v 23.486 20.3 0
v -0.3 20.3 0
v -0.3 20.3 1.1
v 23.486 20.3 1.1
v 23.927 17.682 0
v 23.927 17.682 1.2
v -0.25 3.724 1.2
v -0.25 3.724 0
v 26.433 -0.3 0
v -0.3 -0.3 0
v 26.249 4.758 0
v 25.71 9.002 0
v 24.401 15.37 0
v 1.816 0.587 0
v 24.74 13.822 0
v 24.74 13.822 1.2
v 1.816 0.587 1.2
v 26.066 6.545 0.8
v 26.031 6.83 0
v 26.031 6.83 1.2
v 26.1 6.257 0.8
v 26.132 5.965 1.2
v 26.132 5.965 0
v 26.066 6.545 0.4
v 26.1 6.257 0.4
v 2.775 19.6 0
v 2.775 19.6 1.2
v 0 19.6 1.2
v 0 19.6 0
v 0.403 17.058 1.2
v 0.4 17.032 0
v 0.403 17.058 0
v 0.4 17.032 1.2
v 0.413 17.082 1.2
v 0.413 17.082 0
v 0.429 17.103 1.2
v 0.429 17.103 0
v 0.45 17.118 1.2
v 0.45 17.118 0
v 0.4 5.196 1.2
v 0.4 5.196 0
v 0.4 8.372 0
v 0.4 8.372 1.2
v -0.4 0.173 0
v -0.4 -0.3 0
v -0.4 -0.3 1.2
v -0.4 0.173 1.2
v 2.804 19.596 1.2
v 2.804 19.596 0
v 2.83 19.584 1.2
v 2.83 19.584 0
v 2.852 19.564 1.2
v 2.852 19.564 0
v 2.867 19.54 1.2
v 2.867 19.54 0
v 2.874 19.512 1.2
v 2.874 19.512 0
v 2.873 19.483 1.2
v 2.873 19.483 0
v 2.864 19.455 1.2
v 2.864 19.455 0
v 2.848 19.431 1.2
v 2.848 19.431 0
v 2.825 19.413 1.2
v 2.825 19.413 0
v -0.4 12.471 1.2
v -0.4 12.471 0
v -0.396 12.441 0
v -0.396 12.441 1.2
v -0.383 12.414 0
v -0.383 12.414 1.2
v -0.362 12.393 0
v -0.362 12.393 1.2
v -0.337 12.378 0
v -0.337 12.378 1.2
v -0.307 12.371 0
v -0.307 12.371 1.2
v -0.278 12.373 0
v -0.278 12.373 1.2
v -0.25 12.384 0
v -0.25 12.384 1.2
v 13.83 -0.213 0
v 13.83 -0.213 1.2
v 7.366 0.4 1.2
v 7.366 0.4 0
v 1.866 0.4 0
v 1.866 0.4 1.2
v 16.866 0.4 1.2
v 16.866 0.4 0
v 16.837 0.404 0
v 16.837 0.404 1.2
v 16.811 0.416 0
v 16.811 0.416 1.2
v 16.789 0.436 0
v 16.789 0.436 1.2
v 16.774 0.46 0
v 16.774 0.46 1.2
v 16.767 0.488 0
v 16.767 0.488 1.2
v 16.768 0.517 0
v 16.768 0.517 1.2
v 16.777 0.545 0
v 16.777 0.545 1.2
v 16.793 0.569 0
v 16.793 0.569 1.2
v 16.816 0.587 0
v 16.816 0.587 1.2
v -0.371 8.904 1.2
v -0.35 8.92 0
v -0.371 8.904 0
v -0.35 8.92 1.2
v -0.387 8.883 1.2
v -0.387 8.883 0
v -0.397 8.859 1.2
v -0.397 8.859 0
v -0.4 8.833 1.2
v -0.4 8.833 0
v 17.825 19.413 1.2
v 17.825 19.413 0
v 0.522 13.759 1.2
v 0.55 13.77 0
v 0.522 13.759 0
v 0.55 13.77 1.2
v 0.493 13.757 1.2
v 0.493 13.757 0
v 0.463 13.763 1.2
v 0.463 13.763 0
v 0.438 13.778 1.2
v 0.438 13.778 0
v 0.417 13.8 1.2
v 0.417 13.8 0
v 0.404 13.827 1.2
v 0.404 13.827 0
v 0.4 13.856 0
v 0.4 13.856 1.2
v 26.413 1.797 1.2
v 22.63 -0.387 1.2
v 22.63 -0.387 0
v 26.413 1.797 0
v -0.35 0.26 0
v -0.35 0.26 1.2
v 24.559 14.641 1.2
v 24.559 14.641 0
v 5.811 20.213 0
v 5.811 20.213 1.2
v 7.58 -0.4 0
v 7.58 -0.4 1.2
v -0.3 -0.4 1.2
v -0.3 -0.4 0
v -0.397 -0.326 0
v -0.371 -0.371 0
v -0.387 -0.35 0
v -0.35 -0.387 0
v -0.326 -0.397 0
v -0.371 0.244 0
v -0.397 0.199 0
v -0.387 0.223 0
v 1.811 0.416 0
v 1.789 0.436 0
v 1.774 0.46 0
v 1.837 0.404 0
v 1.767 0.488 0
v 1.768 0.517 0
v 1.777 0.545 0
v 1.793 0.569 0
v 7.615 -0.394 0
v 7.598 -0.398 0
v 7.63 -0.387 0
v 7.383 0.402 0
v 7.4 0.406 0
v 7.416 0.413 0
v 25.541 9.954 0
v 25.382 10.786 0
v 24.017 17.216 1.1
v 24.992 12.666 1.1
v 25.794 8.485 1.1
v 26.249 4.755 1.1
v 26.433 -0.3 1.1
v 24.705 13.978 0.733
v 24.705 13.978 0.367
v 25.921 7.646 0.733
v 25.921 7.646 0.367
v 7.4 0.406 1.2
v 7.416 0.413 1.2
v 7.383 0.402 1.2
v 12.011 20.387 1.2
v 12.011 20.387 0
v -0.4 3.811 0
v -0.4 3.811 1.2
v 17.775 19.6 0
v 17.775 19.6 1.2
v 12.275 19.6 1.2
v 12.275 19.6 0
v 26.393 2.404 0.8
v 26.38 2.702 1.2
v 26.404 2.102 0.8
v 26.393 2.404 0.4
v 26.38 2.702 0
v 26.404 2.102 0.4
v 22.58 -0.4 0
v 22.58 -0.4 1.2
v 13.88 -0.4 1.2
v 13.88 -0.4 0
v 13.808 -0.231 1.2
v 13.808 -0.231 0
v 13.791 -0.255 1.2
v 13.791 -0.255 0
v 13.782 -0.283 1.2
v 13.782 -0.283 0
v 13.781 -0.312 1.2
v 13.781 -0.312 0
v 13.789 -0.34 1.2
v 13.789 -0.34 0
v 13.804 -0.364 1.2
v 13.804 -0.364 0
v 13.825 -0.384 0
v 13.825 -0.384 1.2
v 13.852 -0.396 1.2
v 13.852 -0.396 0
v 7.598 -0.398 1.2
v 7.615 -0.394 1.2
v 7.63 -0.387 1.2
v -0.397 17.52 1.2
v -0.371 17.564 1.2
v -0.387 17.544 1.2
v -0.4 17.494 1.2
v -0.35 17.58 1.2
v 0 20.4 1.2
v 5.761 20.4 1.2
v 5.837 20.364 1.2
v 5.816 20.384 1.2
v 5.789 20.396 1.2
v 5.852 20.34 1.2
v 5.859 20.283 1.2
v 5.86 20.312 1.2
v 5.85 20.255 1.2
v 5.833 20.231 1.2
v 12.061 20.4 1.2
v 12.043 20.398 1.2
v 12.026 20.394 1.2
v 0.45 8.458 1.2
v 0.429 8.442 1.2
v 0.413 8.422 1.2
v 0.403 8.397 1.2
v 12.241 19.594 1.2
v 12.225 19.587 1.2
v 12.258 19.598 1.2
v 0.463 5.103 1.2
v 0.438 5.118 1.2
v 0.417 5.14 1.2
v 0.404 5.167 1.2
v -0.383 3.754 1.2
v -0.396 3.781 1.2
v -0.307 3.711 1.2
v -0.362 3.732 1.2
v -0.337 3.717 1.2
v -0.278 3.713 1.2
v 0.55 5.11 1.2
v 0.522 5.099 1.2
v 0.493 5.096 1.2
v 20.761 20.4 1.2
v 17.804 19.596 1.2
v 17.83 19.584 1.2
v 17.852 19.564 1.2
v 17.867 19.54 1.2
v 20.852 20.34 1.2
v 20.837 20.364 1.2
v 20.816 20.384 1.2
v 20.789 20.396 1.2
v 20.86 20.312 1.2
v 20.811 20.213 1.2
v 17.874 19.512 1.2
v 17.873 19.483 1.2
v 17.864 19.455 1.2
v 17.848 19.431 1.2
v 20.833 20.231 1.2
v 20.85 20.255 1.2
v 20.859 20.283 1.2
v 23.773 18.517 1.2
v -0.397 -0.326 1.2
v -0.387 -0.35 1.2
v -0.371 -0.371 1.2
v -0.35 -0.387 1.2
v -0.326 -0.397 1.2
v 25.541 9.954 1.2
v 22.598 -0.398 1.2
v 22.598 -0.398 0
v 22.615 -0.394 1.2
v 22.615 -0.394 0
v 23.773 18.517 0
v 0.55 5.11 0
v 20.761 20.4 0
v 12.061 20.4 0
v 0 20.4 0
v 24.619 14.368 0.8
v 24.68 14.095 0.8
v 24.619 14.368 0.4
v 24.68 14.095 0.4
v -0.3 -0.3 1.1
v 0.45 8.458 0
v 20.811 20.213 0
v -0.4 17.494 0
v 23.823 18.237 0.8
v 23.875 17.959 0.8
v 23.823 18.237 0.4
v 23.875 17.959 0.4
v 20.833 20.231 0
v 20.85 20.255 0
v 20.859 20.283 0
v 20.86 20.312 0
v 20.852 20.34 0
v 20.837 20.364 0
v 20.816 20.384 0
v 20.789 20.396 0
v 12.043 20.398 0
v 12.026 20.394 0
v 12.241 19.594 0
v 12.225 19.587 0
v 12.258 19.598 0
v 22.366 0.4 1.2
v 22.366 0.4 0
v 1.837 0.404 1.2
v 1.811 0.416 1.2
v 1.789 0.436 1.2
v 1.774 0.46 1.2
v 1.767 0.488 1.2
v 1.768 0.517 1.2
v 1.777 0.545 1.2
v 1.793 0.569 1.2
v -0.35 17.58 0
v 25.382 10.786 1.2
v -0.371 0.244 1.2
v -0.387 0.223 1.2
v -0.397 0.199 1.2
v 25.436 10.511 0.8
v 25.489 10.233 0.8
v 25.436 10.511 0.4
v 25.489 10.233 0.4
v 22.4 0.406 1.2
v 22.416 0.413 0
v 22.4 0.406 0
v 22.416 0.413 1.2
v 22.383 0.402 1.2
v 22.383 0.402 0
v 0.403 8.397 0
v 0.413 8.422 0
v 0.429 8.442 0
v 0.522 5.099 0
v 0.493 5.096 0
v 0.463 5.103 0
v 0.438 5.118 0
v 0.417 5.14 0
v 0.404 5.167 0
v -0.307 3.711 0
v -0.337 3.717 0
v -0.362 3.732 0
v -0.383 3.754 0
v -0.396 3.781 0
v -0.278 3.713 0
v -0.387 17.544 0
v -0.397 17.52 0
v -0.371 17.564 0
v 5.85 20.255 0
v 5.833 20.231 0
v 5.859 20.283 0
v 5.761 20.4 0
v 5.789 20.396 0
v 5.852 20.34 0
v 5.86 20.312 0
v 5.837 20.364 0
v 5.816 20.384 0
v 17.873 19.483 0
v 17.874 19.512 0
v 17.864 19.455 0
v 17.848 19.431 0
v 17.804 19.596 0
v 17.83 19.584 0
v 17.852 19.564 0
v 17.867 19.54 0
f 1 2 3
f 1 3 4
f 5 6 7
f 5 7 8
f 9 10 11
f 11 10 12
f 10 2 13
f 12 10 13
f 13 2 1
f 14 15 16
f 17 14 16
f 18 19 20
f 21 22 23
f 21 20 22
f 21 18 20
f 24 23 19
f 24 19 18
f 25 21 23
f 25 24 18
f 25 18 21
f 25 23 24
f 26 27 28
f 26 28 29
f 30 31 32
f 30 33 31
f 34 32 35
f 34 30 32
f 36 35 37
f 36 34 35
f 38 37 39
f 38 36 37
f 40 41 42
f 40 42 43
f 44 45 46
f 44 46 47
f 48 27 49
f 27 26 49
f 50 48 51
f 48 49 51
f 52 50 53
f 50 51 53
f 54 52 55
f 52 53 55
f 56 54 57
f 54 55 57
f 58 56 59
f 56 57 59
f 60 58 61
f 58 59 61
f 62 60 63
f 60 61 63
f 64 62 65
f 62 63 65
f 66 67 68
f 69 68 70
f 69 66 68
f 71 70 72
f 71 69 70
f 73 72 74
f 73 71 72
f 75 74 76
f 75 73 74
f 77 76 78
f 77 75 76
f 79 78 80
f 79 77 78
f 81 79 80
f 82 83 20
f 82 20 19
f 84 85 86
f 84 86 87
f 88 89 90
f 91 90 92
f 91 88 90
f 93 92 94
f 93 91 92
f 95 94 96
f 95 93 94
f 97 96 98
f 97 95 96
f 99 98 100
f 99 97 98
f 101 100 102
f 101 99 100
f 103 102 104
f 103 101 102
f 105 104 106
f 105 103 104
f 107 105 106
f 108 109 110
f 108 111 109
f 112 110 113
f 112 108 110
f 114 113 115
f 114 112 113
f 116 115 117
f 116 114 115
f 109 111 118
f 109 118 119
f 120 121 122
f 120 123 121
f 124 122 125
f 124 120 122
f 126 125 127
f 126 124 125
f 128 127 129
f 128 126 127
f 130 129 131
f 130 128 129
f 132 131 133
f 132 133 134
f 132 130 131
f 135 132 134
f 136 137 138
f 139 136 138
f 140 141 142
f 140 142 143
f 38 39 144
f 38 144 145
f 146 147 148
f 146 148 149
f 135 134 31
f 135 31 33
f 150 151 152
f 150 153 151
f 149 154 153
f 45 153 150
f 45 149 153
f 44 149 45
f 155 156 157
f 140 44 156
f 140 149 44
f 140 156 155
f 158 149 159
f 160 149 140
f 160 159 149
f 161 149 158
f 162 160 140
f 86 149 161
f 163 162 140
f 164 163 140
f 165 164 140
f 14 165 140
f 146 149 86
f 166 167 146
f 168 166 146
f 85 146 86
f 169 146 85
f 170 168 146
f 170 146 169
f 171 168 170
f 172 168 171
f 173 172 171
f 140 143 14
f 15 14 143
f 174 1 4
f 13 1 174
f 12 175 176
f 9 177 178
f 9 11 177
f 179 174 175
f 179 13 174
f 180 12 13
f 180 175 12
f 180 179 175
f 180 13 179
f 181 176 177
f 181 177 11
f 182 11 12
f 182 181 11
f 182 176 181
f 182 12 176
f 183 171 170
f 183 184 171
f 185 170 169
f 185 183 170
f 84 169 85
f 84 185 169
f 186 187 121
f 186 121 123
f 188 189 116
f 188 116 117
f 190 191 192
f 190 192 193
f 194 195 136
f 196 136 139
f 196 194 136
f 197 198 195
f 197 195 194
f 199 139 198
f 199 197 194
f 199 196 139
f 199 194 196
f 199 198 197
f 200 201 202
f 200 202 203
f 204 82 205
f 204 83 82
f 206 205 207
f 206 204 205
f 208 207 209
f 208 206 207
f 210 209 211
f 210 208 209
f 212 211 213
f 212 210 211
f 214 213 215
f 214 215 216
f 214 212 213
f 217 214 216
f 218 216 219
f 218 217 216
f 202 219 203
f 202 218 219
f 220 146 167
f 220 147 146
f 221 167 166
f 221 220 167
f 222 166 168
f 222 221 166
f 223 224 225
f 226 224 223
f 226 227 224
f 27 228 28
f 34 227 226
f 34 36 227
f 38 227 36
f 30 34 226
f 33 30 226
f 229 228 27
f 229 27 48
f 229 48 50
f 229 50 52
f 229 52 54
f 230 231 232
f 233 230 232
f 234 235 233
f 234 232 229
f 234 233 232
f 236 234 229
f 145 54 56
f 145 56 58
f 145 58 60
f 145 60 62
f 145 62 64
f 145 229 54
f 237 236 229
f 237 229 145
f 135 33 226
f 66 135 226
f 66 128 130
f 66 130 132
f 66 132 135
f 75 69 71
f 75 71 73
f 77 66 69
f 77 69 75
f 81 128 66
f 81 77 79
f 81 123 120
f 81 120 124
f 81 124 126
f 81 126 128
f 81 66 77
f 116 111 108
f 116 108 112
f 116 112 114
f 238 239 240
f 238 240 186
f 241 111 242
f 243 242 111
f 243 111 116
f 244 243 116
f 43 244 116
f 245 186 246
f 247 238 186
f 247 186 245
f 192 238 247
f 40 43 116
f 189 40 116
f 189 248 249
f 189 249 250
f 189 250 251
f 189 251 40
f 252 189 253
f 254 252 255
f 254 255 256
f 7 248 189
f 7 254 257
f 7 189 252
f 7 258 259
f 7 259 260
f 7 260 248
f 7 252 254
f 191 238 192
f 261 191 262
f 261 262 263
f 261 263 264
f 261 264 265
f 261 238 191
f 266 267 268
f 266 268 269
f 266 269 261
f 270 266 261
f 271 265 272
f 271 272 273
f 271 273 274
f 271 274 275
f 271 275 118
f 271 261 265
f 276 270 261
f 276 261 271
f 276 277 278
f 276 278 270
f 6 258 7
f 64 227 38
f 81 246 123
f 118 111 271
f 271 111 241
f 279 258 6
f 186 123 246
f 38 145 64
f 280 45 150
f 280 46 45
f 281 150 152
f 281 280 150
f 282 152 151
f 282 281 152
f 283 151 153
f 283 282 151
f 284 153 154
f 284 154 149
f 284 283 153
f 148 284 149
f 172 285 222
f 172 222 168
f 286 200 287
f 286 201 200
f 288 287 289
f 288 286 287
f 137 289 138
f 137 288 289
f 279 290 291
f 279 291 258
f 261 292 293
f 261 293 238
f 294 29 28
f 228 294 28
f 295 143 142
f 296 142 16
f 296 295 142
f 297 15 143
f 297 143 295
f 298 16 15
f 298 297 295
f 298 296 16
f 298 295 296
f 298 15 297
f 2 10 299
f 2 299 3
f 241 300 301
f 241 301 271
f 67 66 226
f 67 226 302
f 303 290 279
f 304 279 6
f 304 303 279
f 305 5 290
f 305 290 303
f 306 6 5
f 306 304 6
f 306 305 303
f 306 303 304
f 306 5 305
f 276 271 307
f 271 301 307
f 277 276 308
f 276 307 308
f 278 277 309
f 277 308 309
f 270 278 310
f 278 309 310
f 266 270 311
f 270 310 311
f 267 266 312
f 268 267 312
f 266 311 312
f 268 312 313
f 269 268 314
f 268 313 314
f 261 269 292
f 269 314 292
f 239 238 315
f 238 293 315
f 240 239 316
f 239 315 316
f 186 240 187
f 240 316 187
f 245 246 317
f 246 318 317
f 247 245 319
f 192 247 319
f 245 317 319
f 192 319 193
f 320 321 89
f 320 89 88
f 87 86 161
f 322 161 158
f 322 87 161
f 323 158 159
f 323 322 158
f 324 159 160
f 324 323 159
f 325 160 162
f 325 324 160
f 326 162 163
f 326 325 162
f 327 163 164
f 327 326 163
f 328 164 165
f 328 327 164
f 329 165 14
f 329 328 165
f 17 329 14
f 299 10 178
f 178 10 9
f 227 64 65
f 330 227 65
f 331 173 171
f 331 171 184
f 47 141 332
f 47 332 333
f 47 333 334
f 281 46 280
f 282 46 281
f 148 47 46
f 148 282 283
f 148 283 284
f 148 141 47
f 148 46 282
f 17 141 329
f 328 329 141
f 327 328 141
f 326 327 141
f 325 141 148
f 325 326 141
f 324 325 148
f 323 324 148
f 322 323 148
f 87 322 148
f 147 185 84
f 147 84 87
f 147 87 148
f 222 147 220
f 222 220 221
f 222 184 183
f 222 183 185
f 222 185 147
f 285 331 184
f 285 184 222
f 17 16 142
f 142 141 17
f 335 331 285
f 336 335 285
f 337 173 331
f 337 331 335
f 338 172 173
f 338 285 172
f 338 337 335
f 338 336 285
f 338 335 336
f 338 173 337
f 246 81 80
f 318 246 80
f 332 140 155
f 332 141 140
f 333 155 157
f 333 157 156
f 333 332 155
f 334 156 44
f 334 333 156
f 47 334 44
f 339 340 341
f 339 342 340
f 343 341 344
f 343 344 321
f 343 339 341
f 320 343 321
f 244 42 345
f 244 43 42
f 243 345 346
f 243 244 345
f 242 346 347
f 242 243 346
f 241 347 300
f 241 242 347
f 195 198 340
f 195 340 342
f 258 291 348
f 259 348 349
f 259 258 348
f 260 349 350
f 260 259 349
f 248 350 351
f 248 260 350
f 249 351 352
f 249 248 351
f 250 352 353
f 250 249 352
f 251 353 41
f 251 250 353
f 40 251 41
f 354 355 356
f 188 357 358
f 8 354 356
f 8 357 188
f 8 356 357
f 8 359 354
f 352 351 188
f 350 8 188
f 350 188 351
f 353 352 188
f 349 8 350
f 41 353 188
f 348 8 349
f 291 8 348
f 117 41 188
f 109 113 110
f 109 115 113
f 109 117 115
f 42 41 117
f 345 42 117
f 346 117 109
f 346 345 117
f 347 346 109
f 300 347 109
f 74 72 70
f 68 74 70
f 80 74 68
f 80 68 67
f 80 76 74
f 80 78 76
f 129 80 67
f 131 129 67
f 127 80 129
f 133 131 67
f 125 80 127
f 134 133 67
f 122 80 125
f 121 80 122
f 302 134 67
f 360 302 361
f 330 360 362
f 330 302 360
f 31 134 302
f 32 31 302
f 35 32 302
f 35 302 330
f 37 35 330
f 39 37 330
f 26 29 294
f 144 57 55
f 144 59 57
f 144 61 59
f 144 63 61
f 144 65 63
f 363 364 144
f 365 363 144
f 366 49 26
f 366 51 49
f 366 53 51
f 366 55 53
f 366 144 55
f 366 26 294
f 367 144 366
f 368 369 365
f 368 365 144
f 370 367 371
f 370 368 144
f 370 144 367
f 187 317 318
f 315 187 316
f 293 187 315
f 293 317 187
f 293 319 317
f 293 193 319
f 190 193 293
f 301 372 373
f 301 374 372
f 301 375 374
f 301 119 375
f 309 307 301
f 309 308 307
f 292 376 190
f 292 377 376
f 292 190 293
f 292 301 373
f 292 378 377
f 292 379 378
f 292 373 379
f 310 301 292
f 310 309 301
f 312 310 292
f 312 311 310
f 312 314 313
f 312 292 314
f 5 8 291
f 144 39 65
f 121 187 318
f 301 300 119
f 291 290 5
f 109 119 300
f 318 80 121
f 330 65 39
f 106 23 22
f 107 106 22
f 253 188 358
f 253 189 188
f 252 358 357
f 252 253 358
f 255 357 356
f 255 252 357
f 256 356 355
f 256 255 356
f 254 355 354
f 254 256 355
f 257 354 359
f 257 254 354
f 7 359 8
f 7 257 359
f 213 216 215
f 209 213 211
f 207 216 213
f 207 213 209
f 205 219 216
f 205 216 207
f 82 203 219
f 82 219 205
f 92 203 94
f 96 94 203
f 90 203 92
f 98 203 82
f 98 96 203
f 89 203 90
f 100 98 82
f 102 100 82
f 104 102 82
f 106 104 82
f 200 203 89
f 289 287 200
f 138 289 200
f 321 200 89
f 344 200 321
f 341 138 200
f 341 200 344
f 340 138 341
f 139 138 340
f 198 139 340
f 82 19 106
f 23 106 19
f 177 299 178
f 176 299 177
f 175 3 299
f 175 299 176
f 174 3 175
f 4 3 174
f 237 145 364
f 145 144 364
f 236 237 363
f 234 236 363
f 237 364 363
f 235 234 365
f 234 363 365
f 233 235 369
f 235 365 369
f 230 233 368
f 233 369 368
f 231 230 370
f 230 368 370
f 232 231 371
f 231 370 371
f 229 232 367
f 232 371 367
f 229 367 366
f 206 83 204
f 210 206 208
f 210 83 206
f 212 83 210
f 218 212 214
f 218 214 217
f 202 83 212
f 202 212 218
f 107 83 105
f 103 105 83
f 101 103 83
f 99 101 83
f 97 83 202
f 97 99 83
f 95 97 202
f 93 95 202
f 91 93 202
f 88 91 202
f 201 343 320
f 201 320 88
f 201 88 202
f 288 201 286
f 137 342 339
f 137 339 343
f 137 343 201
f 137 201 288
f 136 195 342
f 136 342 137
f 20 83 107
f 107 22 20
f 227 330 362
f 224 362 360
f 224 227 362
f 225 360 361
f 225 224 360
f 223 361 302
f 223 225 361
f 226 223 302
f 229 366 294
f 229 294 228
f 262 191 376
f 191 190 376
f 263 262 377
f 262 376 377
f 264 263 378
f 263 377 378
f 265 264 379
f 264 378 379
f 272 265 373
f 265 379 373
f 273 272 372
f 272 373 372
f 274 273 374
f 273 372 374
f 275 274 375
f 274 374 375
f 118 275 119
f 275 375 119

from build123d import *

# Parameters (mm, degrees)
F6_W      = 62.8235205077
F6_H      = 37.2700802982
F7_DEPTH  = 25
F9_W      = 50.6
F9_H      = 20.6
F10_DEPTH = 1.1
F11_R     = 0.1
F13_DEPTH = 25


with BuildPart() as f5:
    # F5: sweep along a path in F2
    with BuildLine(Plane.XY) as f5_path:
        Line((0, 20), (4.6410161514, 20))
        Line((4.6410161514, 20), (0, 17.3205080757))
        Line((0, 17.3205080757), (0, 12.9903810568))
        Line((0, 12.9903810568), (12.1410161514, 20))
        Line((12.1410161514, 20), (19.6410161514, 20))
        Line((19.6410161514, 20), (0, 8.6602540378))
        Line((0, 8.6602540378), (0, 4.3301270189))
        Line((0, 4.3301270189), (27.1410161514, 20))
        Line((27.1410161514, 20), (34.6410161514, 20))
        Line((34.6410161514, 20), (0, 0))
        Line((0, 0), (7.5, 0))
        Line((7.5, 0), (42.1410161514, 20))
        Line((42.1410161514, 20), (49.6410161514, 20))
        Line((49.6410161514, 20), (15, 0))
        Line((15, 0), (22.5, 0))
        Line((22.5, 0), (50, 15.8771324027))
        Line((50, 15.8771324027), (50, 11.5470053838))
        Line((50, 11.5470053838), (30, 0))
        Line((30, 0), (37.5, 0))
        Line((37.5, 0), (50, 7.2168783649))
        Line((50, 7.2168783649), (50, 2.8867513459))
        Line((50, 2.8867513459), (45, 0))
        Line((45, 0), (50, 0))
    # F4 (on line) → F5 (sweep)
    with BuildSketch(Plane.YZ):
        Polygon((19.6, 0), (20, 0), (20.4, 0), (20.4, 1.2), (20, 1.2), (19.6, 1.2), align=None)
    sweep(path=f5_path.line, transition=Transition.RIGHT)


with BuildPart() as f7:
    # F6 (on Top) → F7 (new body)
    with BuildSketch(Plane.XY):
        with Locations((25.02031927, 9.5404535532)):
            Rectangle(F6_W, F6_H)
        Polygon((-0.4, 3.6373066959), (-0.4, 8.8911941455), (-0.4, 20.4), (0, 20.4), (6.1338364744, 20.4), (50.4, 20.4), (50.4, 16.5699527257), (50.4, 11.3160652761), (50.4, -0.4), (37.607179677, -0.4), (28.507179677, -0.4), (-0.4, -0.4), align=None, mode=Mode.SUBTRACT)
    extrude(amount=F7_DEPTH)


with BuildPart() as f5_1:
    add(f5.part)

    # F8: cut F7
    add(f7.part, mode=Mode.SUBTRACT)

    # F11
    f11_edges = [f5_1.edges().sort_by_distance(p)[0] for p in [
        (-0.4, 17.551448, 0.6),
        (3.148196, 19.6, 0.6),
        (6.133836, 20.4, 0.6),
        (0.4, 17.089568, 0.6),
        (0.4, 13.683201, 0.6),
        (-0.4, 12.297561, 0.6),
        (12.248196, 19.6, 0.6),
        (12.033836, 20.4, 0.6),
        (18.148196, 19.6, 0.6),
        (21.133836, 20.4, 0.6),
        (27.033836, 20.4, 0.6),
        (-0.4, 8.891194, 0.6),
        (0.4, 8.429314, 0.6),
        (0.4, 5.022947, 0.6),
        (-0.4, 3.637307, 0.6),
        (27.248196, 19.6, 0.6),
        (33.148196, 19.6, 0.6),
        (36.133836, 20.4, 0.6),
        (42.033836, 20.4, 0.6),
        (-0.4, 0.23094, 0.6),
        (1.49282, 0.4, 0.6),
        (-0.4, -0.4, 0.6),
        (7.39282, 0.4, 0.6),
        (7.60718, -0.4, 0.6),
        (42.248196, 19.6, 0.6),
        (48.148196, 19.6, 0.6),
        (50.4, 20.4, 0.6),
        (50.4, 19.976319, 0.6),
        (50.4, 16.569953, 0.6),
        (49.6, 15.184312, 0.6),
        (49.6, 11.777945, 0.6),
        (50.4, 11.316065, 0.6),
        (28.50718, -0.4, 0.6),
        (31.49282, 0.4, 0.6),
        (22.60718, -0.4, 0.6),
        (13.50718, -0.4, 0.6),
        (16.49282, 0.4, 0.6),
        (37.39282, 0.4, 0.6),
        (22.39282, 0.4, 0.6),
        (50.4, 7.909699, 0.6),
        (49.6, 6.524058, 0.6),
        (37.60718, -0.4, 0.6),
        (43.50718, -0.4, 0.6),
        (50.4, 2.655811, 0.6),
        (46.49282, 0.4, 0.6),
        (49.6, 3.117691, 0.6),
    ]]
    fillet(f11_edges, radius=F11_R)


with BuildPart() as f10:
    # F9 (on Top) → F10 (new body)
    with BuildSketch(Plane.XY):
        with Locations((25, 10)):
            Rectangle(F9_W, F9_H)
    extrude(amount=F10_DEPTH)


with BuildPart() as f13:
    # F12 (on Top) → F13 (new body)
    with BuildSketch(Plane.XY):
        with BuildLine():
            Line((50.3, 20.4), (42.0606313936, 20.4))
            Line((42.0606313936, 20.4), (33.2614853978, 20.4))
            Line((33.2614853978, 20.4), (23.4711933881, 20.4))
            add(Edge.make_bspline(
                [(23.4711933881, 20.4), (24.4582686573, 13.4666666667), (26.5200901777, 9.0020764619), (26.4324191958, -0.4)],
                knots=[0, 0, 0, 0, 21.0097324658, 21.0097324658, 21.0097324658, 21.0097324658], degree=3))
            Line((26.4324191958, -0.4), (33.2614853978, -0.4))
            Line((33.2614853978, -0.4), (41.2410050631, -0.4))
            Line((41.2410050631, -0.4), (43.8803847577, -0.4))
            Line((43.8803847577, -0.4), (50, -0.4))
            Line((50, -0.4), (50.4, -0.4))
            Line((50.4, -0.4), (50.4, 11.373800303))
            Line((50.4, 11.373800303), (50.4, 16.396747645))
            Line((50.4, 16.396747645), (50.4, 20.4))
            Line((50.4, 20.4), (50.3, 20.4))
        make_face()
    extrude(amount=F13_DEPTH)


with BuildPart() as f10_1:
    add(f10.part)

    # F14: cut F13
    add(f13.part, mode=Mode.SUBTRACT)


with BuildPart() as f5_2:
    add(f5_1.part)

    # F14: cut F13
    add(f13.part, mode=Mode.SUBTRACT)


solid = Compound([f10_1.part, f5_2.part])
